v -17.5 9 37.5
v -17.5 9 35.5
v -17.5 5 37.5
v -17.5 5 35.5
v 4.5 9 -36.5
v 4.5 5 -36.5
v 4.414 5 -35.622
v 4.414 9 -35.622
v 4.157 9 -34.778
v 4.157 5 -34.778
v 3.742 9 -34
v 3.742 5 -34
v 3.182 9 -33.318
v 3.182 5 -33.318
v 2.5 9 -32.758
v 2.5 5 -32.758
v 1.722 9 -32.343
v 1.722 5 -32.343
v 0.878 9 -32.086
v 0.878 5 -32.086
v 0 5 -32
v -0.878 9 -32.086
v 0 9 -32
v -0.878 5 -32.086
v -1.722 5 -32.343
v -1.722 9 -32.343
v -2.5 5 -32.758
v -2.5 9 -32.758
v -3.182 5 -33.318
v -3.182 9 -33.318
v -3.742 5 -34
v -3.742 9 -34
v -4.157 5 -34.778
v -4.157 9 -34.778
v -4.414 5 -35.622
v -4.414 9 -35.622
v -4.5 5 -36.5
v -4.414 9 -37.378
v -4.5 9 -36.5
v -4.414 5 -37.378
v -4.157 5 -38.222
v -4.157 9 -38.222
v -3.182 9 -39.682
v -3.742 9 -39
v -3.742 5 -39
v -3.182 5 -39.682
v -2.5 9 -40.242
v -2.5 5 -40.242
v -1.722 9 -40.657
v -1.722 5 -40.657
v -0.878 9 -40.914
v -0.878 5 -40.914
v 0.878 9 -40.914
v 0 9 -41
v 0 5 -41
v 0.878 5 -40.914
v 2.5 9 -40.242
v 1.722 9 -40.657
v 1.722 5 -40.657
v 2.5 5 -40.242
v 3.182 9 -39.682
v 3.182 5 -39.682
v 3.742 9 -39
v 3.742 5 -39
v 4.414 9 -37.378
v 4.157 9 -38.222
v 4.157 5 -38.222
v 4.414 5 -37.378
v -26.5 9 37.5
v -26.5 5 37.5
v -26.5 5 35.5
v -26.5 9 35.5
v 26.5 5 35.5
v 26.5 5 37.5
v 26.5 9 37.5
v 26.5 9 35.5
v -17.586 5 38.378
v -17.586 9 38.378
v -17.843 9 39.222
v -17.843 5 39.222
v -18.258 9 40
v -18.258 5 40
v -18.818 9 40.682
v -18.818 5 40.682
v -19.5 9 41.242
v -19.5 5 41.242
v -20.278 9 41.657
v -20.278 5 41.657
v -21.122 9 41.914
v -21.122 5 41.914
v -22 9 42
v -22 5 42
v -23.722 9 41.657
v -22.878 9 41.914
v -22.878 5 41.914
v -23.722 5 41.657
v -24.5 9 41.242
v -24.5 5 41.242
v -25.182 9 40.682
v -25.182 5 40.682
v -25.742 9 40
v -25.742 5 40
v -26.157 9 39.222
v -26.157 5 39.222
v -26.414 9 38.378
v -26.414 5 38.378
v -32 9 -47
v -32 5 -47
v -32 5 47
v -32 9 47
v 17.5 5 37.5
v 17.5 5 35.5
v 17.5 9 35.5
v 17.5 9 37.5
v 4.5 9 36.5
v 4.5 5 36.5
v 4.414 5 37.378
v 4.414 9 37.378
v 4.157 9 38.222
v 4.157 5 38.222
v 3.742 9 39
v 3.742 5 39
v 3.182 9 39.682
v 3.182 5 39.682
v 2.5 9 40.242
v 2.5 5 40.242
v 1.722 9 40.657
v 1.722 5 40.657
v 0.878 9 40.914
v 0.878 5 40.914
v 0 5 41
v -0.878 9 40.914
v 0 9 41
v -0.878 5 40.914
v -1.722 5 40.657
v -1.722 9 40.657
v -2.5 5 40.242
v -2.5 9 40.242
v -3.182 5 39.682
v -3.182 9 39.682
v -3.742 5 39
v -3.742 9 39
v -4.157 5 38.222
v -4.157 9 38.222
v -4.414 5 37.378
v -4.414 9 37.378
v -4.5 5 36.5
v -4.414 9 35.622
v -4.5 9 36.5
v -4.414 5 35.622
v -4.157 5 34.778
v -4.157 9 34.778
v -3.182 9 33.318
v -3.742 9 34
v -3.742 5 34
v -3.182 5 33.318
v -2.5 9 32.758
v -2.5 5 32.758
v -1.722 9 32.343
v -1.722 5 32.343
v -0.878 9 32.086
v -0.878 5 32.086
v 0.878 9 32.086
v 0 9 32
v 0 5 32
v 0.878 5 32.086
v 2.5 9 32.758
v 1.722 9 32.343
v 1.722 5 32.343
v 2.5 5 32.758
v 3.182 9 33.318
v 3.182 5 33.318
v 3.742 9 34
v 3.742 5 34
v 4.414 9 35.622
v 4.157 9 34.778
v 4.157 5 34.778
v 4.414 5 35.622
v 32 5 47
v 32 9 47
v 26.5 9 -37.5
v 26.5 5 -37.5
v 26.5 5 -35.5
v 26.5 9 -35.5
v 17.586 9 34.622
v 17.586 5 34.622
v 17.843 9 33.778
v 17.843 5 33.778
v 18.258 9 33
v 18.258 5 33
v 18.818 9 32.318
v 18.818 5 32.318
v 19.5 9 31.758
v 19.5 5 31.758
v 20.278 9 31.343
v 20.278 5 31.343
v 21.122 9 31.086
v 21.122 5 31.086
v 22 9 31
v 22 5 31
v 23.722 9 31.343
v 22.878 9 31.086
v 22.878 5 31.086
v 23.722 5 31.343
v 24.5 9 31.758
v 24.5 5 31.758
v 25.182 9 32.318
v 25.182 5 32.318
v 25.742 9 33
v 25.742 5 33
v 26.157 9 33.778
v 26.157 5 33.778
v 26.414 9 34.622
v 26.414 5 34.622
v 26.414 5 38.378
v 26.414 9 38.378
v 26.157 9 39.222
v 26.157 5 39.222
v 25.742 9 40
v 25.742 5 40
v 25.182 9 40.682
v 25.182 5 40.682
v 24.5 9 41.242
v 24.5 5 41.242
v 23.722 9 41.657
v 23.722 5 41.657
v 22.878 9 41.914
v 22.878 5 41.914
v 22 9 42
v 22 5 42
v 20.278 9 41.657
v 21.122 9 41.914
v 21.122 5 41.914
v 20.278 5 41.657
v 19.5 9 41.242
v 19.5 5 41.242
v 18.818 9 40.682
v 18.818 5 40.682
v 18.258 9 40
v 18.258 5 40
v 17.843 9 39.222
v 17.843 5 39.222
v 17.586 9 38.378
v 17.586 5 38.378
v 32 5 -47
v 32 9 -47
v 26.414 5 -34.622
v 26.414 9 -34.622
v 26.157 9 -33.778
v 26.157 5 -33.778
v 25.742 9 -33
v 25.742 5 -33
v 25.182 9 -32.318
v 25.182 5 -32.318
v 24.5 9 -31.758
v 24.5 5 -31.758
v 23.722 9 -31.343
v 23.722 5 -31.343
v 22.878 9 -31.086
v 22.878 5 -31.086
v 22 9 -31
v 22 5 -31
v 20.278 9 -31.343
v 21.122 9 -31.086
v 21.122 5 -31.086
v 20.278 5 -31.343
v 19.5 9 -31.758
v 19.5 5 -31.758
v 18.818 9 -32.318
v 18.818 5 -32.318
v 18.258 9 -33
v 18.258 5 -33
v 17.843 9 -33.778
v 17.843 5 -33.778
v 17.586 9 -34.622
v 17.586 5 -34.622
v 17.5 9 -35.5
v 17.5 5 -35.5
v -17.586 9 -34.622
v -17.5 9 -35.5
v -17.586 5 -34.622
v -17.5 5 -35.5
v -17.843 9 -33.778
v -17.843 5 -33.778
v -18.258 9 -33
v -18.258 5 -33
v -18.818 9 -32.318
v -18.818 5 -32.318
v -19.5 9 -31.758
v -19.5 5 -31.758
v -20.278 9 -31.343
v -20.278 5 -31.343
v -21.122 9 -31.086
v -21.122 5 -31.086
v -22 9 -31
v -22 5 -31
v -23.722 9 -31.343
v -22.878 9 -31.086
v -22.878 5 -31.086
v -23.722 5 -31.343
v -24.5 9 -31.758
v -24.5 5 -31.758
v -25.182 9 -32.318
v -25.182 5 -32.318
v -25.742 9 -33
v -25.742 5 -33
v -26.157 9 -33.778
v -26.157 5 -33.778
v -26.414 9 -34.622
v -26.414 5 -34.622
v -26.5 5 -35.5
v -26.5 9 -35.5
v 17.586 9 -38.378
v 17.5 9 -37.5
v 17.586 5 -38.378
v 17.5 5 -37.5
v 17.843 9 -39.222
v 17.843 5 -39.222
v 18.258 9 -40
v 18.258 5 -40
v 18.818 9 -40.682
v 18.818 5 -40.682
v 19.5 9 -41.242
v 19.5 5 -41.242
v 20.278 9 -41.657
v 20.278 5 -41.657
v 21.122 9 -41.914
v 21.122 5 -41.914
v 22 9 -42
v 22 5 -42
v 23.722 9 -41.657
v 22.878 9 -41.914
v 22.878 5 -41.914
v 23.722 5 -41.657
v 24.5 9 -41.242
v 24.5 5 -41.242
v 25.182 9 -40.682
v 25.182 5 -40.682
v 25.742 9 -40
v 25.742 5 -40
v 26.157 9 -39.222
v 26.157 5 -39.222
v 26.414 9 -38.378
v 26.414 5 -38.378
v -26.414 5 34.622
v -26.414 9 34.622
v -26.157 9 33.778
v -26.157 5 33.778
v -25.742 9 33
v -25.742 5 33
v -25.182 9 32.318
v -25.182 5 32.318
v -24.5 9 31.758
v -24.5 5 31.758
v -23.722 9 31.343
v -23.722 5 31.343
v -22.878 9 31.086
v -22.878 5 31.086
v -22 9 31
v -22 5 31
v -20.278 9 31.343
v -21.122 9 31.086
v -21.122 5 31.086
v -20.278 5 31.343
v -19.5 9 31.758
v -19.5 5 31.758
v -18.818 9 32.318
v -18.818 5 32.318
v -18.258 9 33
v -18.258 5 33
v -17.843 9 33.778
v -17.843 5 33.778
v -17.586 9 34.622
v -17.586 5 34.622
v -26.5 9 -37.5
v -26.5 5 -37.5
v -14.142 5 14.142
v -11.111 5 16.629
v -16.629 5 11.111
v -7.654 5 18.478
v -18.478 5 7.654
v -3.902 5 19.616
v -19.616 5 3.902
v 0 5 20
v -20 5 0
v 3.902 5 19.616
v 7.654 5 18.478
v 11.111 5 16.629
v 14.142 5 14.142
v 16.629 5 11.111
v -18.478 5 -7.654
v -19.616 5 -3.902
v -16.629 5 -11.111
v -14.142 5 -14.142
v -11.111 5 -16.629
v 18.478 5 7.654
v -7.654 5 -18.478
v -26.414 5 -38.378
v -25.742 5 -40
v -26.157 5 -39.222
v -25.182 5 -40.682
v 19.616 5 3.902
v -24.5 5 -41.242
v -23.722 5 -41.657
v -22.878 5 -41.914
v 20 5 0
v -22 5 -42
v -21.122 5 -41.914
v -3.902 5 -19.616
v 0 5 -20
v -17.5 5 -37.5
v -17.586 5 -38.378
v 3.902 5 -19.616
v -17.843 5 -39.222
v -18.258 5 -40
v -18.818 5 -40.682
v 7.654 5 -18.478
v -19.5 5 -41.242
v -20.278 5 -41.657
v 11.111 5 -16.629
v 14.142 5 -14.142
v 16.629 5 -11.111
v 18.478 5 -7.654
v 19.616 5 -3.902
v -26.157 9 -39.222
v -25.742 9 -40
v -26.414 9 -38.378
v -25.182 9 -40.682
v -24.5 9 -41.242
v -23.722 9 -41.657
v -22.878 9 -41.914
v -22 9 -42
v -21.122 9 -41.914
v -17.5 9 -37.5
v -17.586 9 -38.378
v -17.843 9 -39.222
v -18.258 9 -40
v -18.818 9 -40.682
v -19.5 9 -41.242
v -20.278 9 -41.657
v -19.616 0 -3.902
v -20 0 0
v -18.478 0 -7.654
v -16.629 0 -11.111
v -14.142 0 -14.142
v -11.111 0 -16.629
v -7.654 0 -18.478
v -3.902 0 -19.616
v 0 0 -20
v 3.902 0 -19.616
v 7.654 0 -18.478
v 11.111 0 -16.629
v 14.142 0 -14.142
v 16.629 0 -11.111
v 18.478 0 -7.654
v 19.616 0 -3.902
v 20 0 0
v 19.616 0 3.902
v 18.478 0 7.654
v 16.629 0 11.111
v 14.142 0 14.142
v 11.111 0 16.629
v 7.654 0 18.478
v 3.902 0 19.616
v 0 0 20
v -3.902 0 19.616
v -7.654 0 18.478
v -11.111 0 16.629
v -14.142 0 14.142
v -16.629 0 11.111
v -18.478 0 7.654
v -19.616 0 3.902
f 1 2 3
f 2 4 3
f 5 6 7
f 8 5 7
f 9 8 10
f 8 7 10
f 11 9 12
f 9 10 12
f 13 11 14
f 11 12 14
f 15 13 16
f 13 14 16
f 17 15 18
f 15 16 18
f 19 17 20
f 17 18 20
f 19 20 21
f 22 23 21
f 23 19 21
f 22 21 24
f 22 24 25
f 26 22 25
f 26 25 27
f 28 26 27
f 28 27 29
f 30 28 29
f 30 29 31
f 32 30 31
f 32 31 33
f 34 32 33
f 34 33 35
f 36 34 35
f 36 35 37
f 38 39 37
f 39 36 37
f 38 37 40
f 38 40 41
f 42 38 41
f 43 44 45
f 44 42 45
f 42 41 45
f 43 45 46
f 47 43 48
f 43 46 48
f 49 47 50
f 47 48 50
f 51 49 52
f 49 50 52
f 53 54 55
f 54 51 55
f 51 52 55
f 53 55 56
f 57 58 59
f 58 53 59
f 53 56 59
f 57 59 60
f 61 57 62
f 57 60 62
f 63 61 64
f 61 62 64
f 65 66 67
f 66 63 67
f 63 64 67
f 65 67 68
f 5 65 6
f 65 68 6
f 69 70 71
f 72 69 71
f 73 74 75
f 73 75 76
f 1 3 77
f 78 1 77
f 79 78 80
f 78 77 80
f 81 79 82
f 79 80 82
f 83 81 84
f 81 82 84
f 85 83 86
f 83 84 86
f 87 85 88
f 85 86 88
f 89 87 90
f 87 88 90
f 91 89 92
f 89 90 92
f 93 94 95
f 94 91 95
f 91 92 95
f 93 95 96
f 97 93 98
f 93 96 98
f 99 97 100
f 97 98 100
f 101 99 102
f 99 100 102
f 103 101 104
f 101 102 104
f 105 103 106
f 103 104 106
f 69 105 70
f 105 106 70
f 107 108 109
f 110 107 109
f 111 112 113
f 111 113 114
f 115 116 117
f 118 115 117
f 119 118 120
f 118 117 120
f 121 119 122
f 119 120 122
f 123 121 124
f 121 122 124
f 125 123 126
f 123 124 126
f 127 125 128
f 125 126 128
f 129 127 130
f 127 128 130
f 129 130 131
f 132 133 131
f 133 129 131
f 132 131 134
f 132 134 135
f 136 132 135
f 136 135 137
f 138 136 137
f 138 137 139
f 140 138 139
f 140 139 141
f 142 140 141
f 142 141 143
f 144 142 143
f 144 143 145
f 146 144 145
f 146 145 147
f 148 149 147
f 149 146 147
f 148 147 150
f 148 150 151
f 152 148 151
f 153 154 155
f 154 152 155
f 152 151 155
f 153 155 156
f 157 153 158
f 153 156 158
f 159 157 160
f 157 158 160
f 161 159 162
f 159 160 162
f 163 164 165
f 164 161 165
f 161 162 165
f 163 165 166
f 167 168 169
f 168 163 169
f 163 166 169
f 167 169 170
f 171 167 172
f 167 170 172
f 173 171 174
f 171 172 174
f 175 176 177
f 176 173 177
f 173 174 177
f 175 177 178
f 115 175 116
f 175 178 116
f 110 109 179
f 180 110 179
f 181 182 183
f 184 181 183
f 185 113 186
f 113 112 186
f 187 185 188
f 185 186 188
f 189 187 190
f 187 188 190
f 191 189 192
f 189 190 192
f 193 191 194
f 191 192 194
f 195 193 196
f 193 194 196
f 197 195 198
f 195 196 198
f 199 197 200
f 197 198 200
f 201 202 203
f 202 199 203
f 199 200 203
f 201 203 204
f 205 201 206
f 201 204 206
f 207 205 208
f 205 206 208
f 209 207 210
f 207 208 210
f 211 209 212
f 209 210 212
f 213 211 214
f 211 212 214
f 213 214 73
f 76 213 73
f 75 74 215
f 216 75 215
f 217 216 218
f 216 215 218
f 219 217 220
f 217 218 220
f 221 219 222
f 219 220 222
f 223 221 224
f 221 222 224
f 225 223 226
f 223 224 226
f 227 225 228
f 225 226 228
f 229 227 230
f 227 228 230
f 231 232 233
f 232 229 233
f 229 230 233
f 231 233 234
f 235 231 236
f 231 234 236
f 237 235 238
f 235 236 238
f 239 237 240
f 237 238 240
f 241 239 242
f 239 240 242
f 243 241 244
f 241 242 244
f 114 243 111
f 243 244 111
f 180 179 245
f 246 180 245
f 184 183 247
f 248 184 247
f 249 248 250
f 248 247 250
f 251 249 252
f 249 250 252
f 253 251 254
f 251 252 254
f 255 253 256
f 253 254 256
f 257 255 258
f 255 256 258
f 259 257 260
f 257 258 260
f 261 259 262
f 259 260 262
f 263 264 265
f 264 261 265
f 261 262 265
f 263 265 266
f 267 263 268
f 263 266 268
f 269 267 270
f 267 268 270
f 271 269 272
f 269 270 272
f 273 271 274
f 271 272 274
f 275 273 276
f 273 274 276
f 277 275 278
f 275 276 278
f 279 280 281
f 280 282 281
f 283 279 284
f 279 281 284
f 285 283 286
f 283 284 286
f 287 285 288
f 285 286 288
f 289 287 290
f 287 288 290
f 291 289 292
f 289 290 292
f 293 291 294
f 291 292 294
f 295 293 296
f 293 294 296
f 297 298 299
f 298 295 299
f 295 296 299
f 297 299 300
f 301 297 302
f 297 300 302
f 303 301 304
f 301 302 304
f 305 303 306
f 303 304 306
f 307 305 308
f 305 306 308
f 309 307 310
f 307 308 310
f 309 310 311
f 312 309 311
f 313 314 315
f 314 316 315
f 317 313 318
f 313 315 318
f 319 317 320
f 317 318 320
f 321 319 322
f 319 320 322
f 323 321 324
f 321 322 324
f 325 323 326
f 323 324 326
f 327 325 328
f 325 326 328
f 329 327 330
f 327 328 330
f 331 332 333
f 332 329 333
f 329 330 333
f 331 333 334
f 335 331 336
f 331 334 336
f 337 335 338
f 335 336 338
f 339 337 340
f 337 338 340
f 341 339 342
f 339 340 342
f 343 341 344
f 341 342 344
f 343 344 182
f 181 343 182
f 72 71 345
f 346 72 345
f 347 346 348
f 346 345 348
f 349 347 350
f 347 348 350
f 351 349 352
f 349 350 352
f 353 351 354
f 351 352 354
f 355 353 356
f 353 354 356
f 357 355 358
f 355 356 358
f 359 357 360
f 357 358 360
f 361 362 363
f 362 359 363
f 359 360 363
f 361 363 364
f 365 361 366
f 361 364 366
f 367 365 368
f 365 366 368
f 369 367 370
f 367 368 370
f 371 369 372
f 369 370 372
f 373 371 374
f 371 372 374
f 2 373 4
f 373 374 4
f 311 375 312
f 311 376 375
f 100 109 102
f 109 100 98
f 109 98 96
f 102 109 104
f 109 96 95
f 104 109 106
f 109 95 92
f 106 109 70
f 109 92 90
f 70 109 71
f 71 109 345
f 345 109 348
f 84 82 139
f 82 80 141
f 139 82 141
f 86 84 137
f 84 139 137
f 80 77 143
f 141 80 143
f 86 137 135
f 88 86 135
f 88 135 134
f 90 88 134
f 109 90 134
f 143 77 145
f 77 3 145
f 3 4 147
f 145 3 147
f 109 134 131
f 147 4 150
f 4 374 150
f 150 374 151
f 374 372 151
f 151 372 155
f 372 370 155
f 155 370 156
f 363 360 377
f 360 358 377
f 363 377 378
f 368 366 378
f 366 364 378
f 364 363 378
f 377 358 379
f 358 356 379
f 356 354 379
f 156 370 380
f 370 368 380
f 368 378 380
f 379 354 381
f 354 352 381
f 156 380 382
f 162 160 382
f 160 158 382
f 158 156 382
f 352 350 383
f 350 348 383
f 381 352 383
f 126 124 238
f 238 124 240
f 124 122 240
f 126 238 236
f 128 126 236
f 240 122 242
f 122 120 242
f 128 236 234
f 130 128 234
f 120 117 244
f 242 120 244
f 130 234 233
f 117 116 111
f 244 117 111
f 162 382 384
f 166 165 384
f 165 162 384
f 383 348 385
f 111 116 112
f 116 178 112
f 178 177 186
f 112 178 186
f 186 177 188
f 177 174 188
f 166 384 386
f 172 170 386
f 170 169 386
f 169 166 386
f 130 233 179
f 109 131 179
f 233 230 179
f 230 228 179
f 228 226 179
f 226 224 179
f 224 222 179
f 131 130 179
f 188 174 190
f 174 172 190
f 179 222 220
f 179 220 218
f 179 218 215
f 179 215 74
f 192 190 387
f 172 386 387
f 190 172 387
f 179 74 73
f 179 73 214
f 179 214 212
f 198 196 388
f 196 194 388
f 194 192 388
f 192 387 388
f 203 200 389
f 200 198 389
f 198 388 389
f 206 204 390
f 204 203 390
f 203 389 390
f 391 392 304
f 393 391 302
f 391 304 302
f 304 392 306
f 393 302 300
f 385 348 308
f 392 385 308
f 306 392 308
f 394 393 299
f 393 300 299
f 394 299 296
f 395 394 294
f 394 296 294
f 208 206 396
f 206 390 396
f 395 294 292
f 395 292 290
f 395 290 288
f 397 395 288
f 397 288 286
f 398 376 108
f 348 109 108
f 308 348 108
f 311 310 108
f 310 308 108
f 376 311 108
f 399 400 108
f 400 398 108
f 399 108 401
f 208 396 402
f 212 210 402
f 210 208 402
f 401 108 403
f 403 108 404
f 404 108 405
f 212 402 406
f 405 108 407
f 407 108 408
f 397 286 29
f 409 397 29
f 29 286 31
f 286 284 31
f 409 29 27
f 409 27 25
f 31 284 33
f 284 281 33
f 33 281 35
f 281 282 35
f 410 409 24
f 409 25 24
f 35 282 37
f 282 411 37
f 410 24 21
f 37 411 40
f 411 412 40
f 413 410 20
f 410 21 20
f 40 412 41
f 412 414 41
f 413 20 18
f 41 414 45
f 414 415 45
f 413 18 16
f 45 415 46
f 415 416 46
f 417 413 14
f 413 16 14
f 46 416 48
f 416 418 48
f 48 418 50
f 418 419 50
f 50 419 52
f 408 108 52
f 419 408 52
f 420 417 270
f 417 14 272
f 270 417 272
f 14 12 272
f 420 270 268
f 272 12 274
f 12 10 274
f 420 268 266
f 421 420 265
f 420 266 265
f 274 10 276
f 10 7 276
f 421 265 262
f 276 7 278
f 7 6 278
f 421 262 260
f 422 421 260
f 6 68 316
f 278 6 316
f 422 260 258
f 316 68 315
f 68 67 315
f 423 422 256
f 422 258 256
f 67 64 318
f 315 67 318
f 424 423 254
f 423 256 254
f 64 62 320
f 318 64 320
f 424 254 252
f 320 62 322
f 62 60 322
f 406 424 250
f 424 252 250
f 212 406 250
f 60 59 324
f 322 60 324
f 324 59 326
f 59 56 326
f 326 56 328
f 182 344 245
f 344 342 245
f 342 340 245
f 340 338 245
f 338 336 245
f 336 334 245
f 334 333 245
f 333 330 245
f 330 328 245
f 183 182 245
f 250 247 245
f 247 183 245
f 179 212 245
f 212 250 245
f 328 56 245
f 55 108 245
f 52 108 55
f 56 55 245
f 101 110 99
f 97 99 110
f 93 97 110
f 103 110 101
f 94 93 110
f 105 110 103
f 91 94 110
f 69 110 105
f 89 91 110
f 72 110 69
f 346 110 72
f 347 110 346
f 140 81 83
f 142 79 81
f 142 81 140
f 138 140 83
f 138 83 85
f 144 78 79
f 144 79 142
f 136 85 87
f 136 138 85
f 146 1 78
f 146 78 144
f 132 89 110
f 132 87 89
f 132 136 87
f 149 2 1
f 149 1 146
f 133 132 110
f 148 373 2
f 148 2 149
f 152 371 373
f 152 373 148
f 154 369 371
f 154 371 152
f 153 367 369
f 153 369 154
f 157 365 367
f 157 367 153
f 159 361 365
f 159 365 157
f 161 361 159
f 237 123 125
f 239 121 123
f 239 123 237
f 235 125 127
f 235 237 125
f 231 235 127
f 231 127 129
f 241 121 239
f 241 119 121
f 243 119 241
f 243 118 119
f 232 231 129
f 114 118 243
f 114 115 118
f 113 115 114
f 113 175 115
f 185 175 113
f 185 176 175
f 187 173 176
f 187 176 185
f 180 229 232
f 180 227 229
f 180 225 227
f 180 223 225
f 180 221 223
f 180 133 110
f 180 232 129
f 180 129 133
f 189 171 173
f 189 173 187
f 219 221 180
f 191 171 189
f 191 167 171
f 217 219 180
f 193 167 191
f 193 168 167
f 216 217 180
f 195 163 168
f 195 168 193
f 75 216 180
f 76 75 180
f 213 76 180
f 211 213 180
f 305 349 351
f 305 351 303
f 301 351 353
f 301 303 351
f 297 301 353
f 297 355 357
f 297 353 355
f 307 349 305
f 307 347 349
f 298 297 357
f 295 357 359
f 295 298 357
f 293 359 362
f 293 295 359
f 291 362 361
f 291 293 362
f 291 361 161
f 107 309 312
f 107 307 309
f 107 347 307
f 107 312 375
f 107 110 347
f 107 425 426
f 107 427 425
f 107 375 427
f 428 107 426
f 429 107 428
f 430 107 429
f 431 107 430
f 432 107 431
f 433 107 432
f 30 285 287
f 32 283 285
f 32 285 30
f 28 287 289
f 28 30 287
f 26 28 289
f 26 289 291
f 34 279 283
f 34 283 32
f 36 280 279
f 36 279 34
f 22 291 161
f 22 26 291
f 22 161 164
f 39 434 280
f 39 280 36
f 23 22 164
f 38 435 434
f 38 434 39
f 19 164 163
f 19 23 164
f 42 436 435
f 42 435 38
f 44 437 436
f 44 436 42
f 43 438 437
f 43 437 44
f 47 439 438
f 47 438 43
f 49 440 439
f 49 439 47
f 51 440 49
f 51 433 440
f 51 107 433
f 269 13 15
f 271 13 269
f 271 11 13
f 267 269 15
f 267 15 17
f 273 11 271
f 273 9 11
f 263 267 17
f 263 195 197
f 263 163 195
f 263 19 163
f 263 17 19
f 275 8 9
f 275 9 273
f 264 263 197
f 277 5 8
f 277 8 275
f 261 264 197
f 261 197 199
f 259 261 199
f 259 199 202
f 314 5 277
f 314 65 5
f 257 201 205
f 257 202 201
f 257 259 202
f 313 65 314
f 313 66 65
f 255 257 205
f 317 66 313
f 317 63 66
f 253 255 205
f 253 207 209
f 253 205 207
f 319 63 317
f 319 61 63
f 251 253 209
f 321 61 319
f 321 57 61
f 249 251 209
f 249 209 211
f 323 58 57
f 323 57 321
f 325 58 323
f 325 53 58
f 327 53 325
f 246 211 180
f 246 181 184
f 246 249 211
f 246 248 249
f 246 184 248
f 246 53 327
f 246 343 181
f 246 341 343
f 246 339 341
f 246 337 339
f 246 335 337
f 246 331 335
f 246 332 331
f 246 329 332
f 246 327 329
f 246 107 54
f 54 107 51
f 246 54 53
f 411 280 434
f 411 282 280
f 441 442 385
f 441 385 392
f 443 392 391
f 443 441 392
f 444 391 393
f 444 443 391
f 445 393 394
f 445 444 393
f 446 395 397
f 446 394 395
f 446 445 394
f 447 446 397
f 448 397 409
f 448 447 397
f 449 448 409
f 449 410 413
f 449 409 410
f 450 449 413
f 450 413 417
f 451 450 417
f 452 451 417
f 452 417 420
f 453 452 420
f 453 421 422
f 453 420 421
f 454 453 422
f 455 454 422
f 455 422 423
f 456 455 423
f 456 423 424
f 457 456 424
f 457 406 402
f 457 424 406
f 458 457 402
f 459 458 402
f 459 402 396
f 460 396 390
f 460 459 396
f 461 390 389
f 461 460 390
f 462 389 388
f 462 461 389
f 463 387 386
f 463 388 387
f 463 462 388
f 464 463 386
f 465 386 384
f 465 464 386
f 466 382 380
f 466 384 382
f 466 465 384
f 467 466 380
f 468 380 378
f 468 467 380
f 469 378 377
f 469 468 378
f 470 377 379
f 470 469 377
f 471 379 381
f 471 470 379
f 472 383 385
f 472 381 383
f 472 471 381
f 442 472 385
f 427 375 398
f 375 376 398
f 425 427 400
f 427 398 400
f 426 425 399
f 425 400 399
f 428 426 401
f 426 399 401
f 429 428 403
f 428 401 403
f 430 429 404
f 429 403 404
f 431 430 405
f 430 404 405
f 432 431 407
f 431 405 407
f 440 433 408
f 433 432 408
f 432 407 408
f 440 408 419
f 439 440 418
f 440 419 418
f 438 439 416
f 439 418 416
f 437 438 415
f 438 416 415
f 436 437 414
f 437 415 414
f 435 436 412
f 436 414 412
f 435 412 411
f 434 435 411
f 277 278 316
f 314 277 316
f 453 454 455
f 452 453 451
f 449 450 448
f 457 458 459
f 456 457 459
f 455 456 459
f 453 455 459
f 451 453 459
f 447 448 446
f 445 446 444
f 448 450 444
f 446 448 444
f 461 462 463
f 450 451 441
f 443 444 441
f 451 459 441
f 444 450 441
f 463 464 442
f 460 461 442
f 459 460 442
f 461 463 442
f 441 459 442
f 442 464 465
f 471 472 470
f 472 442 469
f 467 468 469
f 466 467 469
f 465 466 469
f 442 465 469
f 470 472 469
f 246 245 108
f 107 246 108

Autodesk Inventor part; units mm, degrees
ref_plane "YZ Plane" through (0, 0, 0) normal (1, 0, 0) x (0, 1, 0)
ref_plane "XZ Plane" through (0, 0, 0) normal (0, 1, 0) x (-1, 0, 0)
ref_plane "XY Plane" through (0, 0, 0) normal (0, 0, 1) x (1, 0, 0)
sketch "Sketch1" plane through (0, 0, 0) normal (0, 1, 0) x (-1, 0, 0)
  circle A0 centre (0, 0) radius 20
  dimension "d0" = 40
extrude "Extrusion1" add sketch "Sketch1" along normal blind 5
sketch "Sketch2" plane through (0, 5, 0) normal (0, 1, 0) x (1, 0, 0)
  line L0 (-32, -47) -> (32, -47)
  line L1 (32, -47) -> (32, 47)
  line L2 (32, 47) -> (-32, 47)
  line L3 (-32, 47) -> (-32, -47)
  line L4 (-32, -47) -> (32, 47) construction
  line L5 (32, -47) -> (-32, 47) construction
  line L6 (-22, -36.5) -> (22, -36.5) construction
  line L7 (22, -36.5) -> (22, 36.5) construction
  line L8 (22, 36.5) -> (-22, 36.5) construction
  line L9 (-22, 36.5) -> (-22, -36.5) construction
  line L10 (-22, -36.5) -> (22, 36.5) construction
  line L11 (22, -36.5) -> (-22, 36.5) construction
  line L12 (-22, 35.5) -> (-22, 37.5) construction
  line L13 (-17.5, 35.5) -> (-17.5, 37.5)
  line L14 (-26.5, 37.5) -> (-26.5, 35.5)
  arc A0 (-26.5, 35.5) -> (-17.5, 35.5) centre (-22, 35.5) ccw
  arc A1 (-17.5, 37.5) -> (-26.5, 37.5) centre (-22, 37.5) ccw
  line L15 (-32, 0) -> (32, 0) construction
  line L16 (0, 47) -> (0, -47) construction
  line L17 (17.5, 35.5) -> (17.5, 37.5)
  line L18 (26.5, 37.5) -> (26.5, 35.5)
  arc A2 (17.5, 35.5) -> (26.5, 35.5) centre (22, 35.5) ccw
  arc A3 (26.5, 37.5) -> (17.5, 37.5) centre (22, 37.5) ccw
  line L19 (-17.5, -35.5) -> (-17.5, -37.5)
  line L20 (-26.5, -37.5) -> (-26.5, -35.5)
  arc A4 (-17.5, -35.5) -> (-26.5, -35.5) centre (-22, -35.5) ccw
  arc A5 (-26.5, -37.5) -> (-17.5, -37.5) centre (-22, -37.5) ccw
  arc A6 (17.5, -37.5) -> (26.5, -37.5) centre (22, -37.5) ccw
  line L21 (26.5, -37.5) -> (26.5, -35.5)
  arc A7 (26.5, -35.5) -> (17.5, -35.5) centre (22, -35.5) ccw
  line L22 (17.5, -35.5) -> (17.5, -37.5)
  circle A8 centre (0, 36.5) radius 4.5
  circle A9 centre (0, -36.5) radius 4.5
  point P0 (0, 0)
  dimension "d3" = 64
  dimension "d4" = 94
  dimension "d5" = 44
  dimension "d6" = 73
  dimension "d7" = 1
  dimension "d8" = 9
  dimension "d9" = 9
  dimension "d10" = 9
extrude "Extrusion2" add sketch "Sketch2" along normal blind 4
properties part number "motor_bracket_upper" material "Steel, Alloy"
